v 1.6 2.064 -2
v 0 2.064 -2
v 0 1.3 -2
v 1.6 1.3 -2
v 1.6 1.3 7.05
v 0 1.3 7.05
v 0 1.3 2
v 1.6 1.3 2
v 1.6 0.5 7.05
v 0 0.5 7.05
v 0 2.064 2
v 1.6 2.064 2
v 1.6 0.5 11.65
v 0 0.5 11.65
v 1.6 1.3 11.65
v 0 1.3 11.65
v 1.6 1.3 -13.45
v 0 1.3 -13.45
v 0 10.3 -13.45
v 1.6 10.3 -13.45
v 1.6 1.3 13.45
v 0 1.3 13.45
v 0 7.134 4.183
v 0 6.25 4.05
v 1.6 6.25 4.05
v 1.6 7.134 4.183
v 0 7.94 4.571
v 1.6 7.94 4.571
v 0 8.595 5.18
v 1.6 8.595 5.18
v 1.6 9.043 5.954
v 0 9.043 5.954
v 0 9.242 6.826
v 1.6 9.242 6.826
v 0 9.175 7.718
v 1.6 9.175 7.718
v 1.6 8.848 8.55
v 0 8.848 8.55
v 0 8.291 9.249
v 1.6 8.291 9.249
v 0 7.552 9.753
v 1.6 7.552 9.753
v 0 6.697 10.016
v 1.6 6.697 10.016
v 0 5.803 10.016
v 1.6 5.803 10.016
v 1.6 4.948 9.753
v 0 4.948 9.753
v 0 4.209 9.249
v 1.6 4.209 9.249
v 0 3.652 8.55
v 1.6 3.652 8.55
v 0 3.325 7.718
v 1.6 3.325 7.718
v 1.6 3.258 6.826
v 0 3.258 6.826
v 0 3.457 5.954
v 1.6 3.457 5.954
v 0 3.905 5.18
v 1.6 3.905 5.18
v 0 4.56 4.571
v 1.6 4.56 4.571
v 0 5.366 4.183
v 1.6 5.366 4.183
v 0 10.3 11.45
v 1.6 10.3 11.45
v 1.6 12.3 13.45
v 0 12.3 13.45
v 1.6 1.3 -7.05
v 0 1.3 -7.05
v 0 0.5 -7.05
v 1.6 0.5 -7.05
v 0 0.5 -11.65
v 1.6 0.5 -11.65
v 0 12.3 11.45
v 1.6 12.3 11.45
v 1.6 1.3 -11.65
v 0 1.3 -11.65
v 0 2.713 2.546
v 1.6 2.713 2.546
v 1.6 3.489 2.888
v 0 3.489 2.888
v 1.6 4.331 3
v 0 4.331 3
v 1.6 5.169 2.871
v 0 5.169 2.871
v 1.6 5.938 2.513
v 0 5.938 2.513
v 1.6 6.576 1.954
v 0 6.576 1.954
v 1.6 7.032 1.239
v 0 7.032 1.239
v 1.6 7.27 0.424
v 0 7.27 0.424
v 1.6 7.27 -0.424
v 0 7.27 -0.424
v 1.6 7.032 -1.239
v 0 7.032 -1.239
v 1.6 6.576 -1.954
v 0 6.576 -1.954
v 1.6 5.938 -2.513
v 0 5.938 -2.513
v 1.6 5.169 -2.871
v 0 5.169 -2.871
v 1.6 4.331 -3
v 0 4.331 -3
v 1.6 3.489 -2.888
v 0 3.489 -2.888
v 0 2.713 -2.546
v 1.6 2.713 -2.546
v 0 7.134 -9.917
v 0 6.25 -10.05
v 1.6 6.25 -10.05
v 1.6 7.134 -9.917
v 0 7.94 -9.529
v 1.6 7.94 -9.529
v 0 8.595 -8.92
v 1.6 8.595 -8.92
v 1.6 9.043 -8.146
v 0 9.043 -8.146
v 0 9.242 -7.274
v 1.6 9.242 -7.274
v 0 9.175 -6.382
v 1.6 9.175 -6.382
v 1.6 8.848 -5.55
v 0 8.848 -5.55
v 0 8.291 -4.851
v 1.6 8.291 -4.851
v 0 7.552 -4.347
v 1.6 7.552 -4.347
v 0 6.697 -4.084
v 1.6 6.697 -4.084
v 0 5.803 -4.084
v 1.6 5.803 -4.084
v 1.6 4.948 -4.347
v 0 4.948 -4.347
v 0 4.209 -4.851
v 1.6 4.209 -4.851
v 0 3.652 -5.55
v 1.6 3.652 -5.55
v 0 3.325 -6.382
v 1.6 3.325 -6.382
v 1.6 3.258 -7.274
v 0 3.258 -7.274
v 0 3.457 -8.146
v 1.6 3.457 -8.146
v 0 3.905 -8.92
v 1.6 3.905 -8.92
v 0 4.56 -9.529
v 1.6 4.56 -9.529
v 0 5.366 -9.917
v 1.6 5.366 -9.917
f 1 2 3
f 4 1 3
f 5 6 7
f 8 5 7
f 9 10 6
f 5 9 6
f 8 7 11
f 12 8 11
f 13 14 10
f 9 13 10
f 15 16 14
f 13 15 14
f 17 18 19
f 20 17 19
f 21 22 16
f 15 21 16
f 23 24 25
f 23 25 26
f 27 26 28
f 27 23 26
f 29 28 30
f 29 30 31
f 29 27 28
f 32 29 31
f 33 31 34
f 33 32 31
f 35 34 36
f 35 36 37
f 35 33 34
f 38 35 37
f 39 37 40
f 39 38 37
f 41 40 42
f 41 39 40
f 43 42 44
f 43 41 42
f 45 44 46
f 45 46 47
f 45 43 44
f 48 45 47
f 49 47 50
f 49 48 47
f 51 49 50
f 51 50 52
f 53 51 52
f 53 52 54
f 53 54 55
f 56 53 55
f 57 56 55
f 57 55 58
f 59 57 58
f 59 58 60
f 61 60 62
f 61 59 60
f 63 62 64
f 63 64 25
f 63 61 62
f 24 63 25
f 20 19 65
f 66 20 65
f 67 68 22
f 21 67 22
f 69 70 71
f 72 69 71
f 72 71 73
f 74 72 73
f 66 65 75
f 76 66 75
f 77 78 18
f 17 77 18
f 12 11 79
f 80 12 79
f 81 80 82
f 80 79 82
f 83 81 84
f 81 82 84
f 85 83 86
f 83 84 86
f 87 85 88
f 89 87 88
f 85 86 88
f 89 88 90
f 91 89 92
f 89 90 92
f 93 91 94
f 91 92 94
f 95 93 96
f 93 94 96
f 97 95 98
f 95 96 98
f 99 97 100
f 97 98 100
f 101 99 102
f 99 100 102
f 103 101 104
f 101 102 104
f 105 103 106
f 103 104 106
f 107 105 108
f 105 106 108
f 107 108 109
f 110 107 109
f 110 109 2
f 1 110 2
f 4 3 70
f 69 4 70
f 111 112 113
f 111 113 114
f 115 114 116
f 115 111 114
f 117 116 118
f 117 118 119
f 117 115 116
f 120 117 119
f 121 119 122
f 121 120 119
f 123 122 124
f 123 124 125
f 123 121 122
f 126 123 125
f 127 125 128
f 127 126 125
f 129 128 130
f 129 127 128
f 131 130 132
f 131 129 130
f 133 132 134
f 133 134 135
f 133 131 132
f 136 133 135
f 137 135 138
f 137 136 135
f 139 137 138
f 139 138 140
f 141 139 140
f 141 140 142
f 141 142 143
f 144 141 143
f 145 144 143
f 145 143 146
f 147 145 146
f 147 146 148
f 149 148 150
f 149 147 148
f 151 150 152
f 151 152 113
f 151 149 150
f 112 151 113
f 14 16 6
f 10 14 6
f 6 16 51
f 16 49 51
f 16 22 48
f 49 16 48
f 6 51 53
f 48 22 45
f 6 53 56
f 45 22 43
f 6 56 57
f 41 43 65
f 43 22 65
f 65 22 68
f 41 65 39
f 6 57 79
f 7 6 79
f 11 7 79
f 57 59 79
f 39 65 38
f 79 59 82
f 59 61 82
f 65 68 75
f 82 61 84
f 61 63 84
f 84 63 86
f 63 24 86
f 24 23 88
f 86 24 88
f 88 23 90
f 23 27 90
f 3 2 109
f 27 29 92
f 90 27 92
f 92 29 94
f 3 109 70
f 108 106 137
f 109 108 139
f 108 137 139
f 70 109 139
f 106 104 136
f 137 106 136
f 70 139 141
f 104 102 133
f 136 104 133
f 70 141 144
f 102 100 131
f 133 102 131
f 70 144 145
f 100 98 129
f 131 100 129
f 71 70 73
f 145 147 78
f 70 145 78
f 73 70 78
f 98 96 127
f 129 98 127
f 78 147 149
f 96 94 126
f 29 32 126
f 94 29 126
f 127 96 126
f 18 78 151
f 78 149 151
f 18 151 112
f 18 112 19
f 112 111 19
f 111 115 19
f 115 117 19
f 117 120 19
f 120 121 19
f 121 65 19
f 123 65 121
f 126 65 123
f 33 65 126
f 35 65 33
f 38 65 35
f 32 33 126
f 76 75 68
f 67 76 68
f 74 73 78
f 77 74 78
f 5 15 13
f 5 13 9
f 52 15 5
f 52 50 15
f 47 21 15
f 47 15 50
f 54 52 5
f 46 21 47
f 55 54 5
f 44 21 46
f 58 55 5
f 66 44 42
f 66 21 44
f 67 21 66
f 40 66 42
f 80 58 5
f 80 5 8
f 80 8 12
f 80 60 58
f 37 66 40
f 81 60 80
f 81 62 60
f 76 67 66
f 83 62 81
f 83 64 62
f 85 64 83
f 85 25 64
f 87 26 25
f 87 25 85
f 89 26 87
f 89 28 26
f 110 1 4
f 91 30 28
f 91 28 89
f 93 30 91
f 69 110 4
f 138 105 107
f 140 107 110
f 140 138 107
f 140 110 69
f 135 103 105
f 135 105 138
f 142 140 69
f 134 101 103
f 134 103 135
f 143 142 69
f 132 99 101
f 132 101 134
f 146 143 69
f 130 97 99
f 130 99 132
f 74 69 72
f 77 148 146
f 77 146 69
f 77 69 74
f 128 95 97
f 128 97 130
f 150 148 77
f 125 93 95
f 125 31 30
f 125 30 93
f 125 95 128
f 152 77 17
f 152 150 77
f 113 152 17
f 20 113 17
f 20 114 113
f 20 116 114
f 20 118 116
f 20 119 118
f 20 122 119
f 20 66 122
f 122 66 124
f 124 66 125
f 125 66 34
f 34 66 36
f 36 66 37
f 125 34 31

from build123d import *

# Parameters (mm, degrees)
SKETCH_2_R      = 3
EXTRUDE_1_DEPTH = 1.6


with BuildPart() as part:
    # 스케치2 → 보스-돌출1 (new body)
    with BuildSketch(Plane(origin=(0, 0, 0), x_dir=(0, 0, -1), z_dir=(1, 0, 0))):
        with BuildLine():
            Line((-13.45, 1.3), (-11.65, 1.3))
            Line((-11.65, 1.3), (-11.65, 0.5))
            Line((-11.65, 0.5), (-7.05, 0.5))
            Line((-7.05, 0.5), (-7.05, 1.3))
            Line((-7.05, 1.3), (-2, 1.3))
            Line((-2, 1.3), (-2, 2.063932023))
            ThreePointArc((-2, 2.063932023), (0, 7.3), (2, 2.063932023))
            Line((2, 2.063932023), (2, 1.3))
            Line((2, 1.3), (7.05, 1.3))
            Line((7.05, 1.3), (7.05, 0.5))
            Line((7.05, 0.5), (11.65, 0.5))
            Line((11.65, 0.5), (11.65, 1.3))
            Line((11.65, 1.3), (13.45, 1.3))
            Line((13.45, 1.3), (13.45, 10.3))
            Line((13.45, 10.3), (-11.45, 10.3))
            Line((-11.45, 10.3), (-11.45, 12.3))
            Line((-11.45, 12.3), (-13.45, 12.3))
            Line((-13.45, 12.3), (-13.45, 1.3))
        make_face()
        with Locations((-7.05, 6.25)):
            Circle(SKETCH_2_R, mode=Mode.SUBTRACT)
        with Locations((7.05, 6.25)):
            Circle(SKETCH_2_R, mode=Mode.SUBTRACT)
    extrude(amount=EXTRUDE_1_DEPTH)


solid = part.part
